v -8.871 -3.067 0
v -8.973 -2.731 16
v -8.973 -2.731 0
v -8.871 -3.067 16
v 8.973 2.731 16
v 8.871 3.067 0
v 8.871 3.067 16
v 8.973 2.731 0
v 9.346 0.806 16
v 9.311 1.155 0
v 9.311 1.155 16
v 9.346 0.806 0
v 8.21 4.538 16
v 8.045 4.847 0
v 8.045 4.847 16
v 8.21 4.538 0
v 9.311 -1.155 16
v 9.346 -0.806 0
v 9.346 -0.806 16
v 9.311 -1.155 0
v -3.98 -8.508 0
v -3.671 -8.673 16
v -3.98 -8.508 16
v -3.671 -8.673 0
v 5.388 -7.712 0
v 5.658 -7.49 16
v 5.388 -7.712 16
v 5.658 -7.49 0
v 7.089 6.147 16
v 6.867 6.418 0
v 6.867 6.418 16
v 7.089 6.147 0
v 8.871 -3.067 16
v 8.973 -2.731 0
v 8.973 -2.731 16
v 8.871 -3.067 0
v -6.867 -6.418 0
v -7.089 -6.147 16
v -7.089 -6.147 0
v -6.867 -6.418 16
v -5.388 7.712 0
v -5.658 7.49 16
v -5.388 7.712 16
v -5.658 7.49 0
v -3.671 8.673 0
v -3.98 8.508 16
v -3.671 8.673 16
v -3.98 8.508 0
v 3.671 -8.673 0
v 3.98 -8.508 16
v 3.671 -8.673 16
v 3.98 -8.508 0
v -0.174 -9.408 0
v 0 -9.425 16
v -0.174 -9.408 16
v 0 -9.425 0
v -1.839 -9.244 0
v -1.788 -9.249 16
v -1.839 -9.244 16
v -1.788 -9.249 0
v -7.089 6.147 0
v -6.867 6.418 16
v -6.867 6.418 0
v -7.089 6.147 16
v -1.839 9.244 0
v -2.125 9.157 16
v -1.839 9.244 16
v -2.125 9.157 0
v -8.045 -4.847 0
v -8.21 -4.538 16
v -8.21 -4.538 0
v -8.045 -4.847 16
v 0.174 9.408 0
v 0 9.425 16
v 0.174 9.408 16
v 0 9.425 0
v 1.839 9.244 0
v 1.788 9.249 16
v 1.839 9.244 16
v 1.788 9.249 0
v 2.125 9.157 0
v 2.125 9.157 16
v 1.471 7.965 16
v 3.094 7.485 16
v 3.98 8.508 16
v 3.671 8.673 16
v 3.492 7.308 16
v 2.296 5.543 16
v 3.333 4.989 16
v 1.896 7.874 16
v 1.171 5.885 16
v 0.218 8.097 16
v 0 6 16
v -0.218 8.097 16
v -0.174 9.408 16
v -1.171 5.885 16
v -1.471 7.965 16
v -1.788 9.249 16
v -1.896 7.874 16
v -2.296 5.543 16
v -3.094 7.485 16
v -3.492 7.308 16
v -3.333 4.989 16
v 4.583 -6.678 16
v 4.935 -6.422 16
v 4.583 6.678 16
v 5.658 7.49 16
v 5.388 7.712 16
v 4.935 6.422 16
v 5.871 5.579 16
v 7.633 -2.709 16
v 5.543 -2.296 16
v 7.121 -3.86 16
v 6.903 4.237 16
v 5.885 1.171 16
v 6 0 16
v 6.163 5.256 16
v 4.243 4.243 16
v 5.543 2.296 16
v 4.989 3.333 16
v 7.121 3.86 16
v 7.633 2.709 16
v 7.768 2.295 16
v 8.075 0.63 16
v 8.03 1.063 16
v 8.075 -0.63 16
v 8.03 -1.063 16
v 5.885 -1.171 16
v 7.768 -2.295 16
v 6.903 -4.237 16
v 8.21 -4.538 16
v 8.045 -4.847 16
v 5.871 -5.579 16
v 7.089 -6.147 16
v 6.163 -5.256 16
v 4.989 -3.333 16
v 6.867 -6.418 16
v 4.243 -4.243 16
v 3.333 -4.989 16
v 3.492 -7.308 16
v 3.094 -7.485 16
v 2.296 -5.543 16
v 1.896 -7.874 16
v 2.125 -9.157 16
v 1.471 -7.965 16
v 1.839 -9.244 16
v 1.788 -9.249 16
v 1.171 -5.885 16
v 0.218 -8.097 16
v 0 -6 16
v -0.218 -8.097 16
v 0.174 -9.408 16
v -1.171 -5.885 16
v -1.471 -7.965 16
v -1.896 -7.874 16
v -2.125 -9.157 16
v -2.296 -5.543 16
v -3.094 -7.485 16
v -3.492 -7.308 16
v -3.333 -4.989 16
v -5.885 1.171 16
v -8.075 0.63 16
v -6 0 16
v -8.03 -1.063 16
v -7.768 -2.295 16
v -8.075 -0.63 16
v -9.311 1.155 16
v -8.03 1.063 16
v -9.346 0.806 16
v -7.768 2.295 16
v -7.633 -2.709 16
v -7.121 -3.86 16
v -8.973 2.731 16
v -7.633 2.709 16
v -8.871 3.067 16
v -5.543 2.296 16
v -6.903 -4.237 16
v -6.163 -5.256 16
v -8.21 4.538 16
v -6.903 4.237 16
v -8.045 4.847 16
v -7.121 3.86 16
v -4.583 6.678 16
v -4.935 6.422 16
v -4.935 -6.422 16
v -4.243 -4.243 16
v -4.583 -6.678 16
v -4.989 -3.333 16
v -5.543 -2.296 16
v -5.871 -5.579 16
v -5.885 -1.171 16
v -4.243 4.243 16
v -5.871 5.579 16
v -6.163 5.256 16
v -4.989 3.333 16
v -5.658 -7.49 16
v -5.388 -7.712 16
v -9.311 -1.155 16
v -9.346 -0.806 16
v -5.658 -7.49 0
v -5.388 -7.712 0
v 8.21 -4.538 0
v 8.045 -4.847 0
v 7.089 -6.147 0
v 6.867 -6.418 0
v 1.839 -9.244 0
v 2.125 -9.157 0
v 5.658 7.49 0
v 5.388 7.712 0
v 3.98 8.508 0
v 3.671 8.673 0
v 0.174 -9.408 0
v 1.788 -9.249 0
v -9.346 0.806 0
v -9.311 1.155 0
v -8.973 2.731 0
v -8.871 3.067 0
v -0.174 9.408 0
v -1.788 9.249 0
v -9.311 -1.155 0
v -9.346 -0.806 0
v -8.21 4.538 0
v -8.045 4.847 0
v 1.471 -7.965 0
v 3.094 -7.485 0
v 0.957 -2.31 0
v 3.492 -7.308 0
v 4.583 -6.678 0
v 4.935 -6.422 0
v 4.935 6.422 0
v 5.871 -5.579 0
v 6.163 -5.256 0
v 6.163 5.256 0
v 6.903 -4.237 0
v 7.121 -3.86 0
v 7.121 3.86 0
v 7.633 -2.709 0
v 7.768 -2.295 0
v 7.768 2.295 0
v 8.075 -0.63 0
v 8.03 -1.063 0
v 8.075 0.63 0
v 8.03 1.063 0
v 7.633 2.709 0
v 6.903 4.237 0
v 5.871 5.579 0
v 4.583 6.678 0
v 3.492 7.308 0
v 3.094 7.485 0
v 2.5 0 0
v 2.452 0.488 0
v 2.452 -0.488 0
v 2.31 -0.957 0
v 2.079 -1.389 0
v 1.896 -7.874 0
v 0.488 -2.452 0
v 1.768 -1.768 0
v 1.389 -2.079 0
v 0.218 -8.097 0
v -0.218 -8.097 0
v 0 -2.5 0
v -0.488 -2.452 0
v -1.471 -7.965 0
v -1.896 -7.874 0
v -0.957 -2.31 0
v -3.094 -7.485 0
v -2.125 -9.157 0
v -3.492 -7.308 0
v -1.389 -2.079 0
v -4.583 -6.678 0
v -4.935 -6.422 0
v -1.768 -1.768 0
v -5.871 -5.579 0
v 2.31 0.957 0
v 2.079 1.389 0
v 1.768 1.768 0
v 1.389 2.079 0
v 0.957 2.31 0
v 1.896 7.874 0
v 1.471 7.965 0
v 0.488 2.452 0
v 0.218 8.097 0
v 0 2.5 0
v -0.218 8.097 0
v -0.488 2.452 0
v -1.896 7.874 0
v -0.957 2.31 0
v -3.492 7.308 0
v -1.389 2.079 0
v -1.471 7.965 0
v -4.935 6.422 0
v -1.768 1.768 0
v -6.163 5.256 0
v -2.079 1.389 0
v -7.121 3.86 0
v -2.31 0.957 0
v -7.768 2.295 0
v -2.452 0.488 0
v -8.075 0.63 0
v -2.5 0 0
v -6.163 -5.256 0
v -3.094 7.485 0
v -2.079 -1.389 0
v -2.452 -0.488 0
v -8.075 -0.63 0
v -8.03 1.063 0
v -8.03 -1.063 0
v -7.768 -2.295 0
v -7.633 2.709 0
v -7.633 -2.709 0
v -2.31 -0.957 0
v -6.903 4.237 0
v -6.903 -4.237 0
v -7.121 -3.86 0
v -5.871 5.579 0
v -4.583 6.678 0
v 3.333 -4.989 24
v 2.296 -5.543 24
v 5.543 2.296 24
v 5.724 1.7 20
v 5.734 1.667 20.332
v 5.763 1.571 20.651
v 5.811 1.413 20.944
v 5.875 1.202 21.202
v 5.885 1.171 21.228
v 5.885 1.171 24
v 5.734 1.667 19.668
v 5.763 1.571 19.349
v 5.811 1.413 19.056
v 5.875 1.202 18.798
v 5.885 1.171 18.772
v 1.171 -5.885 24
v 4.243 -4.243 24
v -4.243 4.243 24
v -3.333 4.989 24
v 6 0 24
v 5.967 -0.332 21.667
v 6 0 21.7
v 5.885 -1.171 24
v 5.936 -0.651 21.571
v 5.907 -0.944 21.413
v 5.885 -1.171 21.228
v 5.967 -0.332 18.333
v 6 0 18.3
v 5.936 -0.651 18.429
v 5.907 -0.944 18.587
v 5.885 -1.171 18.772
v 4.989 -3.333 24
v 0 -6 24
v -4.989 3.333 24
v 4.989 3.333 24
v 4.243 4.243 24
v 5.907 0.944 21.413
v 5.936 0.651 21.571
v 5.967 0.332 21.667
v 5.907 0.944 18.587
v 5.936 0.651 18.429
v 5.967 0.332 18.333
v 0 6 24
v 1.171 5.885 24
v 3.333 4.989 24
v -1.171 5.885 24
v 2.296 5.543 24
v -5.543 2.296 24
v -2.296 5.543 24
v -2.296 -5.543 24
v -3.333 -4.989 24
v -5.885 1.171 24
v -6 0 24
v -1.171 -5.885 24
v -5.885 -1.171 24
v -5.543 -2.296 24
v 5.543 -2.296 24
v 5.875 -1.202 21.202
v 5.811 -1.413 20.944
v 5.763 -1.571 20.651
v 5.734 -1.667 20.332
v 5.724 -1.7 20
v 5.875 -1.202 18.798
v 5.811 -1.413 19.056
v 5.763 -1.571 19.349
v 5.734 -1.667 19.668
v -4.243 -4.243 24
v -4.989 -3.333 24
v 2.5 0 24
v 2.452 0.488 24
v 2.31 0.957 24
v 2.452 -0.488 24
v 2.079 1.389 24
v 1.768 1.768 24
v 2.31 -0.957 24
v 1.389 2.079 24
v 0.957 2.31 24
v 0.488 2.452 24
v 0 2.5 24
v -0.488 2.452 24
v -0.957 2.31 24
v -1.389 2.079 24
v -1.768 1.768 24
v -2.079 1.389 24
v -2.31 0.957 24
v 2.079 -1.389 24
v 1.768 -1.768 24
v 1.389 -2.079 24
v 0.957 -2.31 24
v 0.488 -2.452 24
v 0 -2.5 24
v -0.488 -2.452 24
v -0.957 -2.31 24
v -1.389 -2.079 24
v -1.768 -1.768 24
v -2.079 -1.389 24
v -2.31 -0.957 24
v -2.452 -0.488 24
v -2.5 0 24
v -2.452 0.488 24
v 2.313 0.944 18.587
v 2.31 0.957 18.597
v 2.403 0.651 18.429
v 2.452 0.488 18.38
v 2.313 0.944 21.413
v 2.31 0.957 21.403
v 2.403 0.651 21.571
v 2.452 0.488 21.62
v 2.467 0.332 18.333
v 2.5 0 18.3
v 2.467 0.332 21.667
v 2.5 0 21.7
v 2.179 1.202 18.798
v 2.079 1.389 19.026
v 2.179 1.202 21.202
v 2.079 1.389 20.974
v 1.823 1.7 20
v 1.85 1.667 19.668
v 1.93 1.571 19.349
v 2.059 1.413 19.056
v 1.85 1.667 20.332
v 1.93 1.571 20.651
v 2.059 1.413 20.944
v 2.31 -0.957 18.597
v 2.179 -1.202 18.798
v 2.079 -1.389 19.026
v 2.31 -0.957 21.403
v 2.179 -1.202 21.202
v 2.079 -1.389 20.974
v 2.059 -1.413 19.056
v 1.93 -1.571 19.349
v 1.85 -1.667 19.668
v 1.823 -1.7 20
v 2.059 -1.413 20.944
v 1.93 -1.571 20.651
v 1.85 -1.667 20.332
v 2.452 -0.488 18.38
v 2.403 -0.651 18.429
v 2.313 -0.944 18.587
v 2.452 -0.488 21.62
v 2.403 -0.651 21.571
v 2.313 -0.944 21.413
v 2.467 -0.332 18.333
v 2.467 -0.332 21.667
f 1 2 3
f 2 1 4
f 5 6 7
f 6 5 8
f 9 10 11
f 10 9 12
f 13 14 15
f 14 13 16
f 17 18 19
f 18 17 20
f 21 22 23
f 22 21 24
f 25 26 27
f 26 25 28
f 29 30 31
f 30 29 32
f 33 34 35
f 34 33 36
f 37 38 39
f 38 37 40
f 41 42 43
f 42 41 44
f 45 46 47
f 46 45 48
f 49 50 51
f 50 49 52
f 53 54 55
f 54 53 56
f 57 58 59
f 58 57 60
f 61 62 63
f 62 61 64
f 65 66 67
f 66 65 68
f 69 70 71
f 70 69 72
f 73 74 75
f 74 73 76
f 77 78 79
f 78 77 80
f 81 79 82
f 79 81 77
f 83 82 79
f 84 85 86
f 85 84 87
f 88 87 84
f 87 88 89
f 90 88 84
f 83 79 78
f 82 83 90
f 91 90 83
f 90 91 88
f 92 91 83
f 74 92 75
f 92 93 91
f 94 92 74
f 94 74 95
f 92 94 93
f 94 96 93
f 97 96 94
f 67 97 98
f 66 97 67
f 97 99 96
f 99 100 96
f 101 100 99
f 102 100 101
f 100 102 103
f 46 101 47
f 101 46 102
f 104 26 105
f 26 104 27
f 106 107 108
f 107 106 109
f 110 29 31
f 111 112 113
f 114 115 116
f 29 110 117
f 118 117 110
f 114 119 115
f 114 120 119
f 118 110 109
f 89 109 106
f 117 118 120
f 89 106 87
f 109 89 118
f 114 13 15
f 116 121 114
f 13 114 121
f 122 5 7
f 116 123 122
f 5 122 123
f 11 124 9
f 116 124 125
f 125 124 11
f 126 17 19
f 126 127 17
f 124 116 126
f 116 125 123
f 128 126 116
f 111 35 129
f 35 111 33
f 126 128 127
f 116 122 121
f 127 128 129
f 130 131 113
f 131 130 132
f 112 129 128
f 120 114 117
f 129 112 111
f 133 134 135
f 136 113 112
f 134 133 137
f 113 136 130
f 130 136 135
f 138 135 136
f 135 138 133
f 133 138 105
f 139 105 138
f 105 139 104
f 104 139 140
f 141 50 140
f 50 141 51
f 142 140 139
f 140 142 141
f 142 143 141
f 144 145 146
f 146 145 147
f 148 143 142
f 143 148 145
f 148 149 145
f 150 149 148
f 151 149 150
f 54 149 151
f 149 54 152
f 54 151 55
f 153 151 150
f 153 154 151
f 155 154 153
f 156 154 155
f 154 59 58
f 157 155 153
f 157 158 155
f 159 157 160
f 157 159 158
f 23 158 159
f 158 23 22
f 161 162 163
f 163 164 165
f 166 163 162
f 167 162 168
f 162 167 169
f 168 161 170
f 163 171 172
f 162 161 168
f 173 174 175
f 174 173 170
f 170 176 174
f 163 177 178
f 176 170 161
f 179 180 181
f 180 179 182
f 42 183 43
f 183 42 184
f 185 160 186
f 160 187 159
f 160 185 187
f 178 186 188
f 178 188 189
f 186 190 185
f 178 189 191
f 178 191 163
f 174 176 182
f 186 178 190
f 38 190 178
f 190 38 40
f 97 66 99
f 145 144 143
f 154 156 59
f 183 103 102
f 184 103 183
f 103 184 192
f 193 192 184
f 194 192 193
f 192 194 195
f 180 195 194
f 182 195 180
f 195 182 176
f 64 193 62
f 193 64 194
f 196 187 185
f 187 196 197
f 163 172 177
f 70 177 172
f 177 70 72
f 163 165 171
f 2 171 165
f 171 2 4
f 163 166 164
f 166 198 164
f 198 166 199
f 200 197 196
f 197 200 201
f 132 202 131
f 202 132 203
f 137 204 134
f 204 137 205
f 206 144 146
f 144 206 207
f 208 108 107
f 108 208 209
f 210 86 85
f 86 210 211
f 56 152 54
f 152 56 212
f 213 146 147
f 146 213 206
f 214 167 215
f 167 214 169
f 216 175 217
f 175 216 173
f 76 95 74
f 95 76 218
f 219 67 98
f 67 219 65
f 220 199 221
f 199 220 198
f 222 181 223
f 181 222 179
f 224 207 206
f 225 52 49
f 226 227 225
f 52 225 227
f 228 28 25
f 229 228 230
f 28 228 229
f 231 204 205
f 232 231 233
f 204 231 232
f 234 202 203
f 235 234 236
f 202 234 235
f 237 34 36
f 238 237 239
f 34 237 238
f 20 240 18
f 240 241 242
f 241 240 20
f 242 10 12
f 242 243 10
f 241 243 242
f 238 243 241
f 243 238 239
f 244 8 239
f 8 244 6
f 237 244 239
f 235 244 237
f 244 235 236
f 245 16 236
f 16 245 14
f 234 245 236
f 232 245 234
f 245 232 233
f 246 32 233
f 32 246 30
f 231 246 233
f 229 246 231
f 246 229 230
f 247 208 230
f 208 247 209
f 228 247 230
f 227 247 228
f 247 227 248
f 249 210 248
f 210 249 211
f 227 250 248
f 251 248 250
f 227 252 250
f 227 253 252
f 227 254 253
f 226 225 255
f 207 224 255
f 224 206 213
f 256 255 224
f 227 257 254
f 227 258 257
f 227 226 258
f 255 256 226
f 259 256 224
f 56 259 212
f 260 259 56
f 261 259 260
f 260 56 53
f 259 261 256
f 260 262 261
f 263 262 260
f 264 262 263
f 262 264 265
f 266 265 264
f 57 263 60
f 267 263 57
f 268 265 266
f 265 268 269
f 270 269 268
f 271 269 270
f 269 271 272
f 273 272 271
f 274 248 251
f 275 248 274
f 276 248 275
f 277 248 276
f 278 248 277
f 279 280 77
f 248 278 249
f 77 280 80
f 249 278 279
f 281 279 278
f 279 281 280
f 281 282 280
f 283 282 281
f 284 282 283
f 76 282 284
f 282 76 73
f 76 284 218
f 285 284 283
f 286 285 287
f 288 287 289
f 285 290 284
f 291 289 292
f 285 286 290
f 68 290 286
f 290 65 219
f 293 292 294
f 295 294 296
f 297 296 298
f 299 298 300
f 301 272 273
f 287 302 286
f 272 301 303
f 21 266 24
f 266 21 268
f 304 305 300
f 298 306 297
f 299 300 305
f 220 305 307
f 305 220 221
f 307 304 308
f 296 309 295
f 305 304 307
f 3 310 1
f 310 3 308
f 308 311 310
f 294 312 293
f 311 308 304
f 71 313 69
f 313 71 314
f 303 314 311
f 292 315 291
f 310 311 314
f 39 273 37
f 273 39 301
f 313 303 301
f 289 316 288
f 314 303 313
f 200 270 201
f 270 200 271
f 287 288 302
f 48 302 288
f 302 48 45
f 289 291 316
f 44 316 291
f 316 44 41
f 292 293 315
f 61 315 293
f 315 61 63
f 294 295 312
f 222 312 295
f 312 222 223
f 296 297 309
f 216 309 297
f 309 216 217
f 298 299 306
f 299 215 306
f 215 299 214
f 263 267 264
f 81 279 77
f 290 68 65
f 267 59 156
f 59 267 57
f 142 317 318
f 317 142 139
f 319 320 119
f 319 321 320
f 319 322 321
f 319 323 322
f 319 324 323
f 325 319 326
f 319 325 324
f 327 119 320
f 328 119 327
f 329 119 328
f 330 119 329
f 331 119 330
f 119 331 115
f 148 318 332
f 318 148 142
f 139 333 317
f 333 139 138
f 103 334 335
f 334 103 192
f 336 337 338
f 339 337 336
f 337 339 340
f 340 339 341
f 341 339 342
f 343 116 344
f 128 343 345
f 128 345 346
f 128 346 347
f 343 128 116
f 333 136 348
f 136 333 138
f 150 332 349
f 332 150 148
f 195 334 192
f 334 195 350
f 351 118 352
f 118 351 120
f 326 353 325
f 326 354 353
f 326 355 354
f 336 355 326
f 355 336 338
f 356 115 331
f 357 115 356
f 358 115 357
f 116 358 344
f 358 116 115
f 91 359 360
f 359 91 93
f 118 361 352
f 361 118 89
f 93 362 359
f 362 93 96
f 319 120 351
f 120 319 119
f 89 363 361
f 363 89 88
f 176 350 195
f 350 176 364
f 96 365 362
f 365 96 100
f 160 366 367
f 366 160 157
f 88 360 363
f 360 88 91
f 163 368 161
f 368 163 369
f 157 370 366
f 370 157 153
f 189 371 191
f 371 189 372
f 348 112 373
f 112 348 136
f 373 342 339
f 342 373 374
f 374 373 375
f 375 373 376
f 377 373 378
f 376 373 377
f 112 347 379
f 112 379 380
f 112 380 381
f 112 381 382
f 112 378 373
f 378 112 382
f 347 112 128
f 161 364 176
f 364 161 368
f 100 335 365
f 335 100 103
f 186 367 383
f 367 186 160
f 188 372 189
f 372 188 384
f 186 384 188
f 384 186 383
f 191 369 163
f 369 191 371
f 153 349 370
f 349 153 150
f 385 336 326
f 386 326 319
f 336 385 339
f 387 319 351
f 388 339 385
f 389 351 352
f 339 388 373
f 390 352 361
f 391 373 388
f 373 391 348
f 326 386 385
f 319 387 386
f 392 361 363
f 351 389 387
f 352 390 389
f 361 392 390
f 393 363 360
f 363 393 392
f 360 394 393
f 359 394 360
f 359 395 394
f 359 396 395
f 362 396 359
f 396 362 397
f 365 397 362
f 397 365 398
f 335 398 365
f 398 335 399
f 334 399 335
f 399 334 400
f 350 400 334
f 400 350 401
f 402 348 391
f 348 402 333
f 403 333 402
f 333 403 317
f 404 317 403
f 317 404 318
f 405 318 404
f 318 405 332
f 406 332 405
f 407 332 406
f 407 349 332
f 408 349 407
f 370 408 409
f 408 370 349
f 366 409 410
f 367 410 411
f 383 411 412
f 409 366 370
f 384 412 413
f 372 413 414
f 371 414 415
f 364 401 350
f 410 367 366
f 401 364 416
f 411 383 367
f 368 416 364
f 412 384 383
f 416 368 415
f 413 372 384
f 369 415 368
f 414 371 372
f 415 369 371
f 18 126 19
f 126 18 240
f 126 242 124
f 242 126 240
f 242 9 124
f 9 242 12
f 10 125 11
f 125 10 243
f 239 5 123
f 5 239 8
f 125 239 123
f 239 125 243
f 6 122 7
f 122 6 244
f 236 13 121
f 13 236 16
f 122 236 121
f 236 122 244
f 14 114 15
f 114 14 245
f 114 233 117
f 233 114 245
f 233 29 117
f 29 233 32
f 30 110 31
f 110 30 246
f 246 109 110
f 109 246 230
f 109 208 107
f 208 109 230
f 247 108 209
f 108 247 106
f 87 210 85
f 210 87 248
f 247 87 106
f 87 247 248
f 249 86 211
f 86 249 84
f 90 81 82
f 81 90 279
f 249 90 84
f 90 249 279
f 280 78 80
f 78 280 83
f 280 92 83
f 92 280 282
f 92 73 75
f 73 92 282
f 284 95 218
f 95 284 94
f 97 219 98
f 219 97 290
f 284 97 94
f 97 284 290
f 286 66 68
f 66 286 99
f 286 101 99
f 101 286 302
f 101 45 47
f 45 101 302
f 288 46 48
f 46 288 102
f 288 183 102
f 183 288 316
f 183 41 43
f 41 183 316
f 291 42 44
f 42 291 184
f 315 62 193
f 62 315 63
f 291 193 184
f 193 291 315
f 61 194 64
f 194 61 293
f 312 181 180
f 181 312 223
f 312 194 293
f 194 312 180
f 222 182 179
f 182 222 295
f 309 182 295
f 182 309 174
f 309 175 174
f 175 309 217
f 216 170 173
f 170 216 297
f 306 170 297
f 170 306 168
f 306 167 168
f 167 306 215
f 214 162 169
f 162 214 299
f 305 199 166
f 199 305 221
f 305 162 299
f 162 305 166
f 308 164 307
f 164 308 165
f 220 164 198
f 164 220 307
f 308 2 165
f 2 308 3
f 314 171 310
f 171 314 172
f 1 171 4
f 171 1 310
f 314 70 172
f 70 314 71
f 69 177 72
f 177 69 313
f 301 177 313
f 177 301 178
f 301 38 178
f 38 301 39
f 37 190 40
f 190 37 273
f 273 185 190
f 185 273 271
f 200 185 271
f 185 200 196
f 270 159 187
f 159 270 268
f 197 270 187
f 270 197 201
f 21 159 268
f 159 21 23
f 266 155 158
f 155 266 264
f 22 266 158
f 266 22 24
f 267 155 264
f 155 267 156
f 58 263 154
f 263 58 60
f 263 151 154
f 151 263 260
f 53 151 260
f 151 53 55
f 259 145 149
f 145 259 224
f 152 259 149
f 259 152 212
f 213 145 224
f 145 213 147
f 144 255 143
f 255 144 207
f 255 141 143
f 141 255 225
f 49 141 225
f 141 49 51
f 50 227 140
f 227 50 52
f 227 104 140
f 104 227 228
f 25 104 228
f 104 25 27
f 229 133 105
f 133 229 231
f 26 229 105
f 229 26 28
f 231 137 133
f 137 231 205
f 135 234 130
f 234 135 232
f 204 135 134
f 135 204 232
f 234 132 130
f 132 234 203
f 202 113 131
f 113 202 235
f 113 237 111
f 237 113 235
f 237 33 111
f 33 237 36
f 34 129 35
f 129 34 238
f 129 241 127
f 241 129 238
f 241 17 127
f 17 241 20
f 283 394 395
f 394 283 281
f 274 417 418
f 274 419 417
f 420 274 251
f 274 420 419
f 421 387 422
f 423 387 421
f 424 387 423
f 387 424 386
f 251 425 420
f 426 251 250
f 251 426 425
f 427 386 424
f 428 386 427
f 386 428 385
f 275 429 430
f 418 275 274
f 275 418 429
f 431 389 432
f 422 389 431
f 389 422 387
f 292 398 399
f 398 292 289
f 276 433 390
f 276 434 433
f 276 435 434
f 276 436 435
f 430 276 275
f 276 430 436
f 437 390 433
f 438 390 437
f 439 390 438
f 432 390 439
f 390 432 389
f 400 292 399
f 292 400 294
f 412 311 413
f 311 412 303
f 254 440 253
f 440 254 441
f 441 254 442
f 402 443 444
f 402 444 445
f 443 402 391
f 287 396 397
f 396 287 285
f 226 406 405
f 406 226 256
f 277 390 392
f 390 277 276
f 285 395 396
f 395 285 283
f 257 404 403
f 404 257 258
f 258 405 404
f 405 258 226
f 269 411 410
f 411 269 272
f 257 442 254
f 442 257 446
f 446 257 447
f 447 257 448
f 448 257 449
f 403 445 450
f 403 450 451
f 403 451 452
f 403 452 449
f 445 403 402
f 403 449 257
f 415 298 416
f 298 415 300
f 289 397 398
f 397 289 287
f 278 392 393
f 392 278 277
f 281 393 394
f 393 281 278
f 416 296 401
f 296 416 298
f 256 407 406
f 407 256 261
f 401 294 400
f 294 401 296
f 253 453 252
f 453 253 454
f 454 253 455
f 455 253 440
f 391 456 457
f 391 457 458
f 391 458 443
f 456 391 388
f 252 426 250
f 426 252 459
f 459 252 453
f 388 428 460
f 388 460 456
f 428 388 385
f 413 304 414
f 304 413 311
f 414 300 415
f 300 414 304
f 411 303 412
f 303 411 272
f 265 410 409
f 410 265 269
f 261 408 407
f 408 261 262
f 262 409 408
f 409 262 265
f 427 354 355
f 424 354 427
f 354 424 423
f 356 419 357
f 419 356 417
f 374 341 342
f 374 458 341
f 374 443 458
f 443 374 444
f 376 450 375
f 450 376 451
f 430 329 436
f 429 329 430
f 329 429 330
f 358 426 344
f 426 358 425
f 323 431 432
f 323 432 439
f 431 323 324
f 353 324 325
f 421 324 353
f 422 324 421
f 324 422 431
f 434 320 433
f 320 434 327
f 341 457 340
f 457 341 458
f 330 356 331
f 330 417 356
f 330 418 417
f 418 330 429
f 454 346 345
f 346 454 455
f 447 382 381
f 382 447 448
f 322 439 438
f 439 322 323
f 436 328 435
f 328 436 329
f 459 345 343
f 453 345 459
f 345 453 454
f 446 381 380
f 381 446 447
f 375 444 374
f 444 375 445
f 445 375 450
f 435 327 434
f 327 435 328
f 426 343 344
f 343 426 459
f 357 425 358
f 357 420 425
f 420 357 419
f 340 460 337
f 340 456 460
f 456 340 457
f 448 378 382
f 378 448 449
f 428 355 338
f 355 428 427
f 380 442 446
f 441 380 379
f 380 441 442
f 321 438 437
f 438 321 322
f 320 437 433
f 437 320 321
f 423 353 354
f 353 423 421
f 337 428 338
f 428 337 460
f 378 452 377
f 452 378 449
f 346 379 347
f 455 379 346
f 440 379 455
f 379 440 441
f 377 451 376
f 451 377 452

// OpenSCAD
$fn = 32;

// ----------------------------------------------------------------------
// Timing pulley: GT2 30T, pitch 2 mm, 18.85 mm x 24 mm
// ----------------------------------------------------------------------

// --- parameters (mm) ---
pitch_mm = 2;             // belt pitch
tooth_count = 30;         // number of grooves
width = 16;               // belt width between the flanges
tip_d = 18.85;            // tip circle diameter
root_d = 17.35;           // groove bottom diameter
groove_h = 0.75;          // groove depth
tooth_w = 1.5;            // groove width at the tip circle
hub_bore = 5;             // shaft bore
hub_d = 12;               // hub diameter
hub_h = 8;                // hub above the flange
bottom_z = 0;             // lowest point of the pulley
top_z = 24;               // highest point of the pulley
set_d = 3.4;              // set screw tap hole

module rim() {
  cylinder(h = width, d = tip_d);
}

module groove_cutter() {
  /* belt tooth groove: deeper than wide, cut through the belt width */
  translate([root_d / 2, 0, 0])
    linear_extrude(height = width)
      polygon(points = [[-0.6, -tooth_w * 0.42], [groove_h + 0.6, -tooth_w * 0.6],
                        [groove_h + 0.6, tooth_w * 0.6], [-0.6, tooth_w * 0.42]]);
}

module hub() {
  translate([0, 0, bottom_z]) cylinder(h = top_z - bottom_z, d = hub_d);
}

difference() {
  union() {
    rim();
    hub();
  }
  for (i = [0 : tooth_count - 1]) rotate([0, 0, i * 360 / tooth_count]) groove_cutter();
  translate([0, 0, bottom_z - 1]) cylinder(h = top_z - bottom_z + 2, d = hub_bore);
  translate([-1, 0, top_z - hub_h * 0.5]) rotate([0, 90, 0]) cylinder(h = hub_d / 2 + 3, d = set_d);
}
